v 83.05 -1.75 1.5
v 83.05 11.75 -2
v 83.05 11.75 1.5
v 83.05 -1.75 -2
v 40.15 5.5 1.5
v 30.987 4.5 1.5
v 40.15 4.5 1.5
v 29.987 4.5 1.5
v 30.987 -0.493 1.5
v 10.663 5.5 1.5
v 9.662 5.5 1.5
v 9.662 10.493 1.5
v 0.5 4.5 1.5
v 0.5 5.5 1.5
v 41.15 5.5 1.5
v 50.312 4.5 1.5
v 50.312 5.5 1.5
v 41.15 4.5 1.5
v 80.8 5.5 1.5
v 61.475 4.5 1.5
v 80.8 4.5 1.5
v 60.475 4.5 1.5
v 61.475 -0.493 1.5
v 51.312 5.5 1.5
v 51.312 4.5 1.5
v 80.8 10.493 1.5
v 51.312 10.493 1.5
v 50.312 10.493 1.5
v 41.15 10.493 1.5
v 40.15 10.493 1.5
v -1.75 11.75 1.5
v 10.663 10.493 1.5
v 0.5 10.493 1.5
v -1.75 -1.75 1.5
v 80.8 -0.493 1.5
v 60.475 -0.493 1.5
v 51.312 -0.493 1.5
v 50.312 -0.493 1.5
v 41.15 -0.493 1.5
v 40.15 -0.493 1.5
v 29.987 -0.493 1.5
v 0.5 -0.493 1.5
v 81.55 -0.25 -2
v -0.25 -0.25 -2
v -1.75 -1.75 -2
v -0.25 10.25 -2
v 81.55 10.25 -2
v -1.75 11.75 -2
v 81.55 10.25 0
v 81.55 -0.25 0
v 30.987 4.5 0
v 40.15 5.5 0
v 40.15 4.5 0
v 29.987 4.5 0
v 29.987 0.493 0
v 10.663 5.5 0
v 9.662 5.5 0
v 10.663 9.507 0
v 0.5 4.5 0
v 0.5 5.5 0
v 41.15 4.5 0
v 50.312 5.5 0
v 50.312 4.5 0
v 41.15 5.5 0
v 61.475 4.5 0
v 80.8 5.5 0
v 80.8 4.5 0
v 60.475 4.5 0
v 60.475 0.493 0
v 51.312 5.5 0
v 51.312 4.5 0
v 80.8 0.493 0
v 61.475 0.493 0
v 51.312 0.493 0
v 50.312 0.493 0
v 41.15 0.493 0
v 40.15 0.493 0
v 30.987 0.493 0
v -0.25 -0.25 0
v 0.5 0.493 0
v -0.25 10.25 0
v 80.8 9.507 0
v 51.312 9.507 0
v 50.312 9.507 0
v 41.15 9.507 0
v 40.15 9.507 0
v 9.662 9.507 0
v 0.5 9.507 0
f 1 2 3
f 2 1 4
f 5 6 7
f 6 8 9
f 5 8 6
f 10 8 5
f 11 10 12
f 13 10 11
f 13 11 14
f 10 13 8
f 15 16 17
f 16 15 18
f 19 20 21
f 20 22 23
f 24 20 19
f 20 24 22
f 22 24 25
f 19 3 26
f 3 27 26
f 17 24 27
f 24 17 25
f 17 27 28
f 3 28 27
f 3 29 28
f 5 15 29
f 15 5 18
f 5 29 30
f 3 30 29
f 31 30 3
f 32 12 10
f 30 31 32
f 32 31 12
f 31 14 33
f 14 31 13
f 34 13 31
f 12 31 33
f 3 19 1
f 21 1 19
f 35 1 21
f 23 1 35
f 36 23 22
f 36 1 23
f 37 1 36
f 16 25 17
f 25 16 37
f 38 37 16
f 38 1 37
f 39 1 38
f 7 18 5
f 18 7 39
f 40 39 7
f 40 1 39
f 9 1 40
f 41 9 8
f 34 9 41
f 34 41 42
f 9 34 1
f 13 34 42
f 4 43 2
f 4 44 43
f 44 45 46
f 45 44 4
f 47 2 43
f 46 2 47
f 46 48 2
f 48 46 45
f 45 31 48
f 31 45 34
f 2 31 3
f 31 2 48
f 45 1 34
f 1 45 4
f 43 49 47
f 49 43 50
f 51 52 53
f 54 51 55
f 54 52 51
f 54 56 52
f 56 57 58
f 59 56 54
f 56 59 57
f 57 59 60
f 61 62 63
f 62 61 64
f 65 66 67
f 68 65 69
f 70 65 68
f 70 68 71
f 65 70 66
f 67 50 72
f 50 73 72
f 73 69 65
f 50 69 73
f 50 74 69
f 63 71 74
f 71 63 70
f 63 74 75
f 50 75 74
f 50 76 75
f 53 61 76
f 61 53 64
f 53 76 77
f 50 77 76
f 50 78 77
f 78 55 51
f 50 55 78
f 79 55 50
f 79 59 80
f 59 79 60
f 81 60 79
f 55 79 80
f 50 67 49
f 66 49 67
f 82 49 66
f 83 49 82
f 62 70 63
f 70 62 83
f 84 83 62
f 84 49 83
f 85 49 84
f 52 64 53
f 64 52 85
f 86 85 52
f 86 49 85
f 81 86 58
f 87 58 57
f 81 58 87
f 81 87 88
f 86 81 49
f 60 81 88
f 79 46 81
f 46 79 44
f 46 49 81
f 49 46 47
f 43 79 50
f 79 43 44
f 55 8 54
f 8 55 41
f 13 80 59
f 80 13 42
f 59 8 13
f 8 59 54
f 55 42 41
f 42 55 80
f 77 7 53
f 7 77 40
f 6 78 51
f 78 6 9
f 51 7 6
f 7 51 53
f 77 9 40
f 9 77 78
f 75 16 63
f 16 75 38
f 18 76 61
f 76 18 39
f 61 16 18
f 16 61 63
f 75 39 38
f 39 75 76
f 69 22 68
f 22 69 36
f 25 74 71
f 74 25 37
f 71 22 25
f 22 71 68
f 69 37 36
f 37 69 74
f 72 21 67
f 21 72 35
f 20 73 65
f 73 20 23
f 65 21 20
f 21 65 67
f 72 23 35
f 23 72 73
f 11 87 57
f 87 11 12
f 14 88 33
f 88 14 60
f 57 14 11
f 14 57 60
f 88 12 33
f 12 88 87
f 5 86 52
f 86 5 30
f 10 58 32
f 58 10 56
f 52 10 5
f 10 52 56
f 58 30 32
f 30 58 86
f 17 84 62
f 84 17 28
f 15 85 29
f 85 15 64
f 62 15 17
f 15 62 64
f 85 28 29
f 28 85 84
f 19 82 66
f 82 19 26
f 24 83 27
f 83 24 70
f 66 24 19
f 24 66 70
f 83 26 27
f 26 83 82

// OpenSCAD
board_x=90.2;
board_y=20.1;
mount_hole_d=2;
mount_hole_inset=mount_hole_d/2 + 0.8; // +-0.1
wire_relief_y=2;
wire_relief_z=4;

indicator_x=81.3/8;
indicator_y=5;
indicator_z=6.3; // +-0.1
indicator_wall=0.6;
indicator_cut_tolerance=2;

spacer_cut_z=2;
spacer_z=1.5;
spacer_wall=1.5;
spacer_r=1;
spacer_mask_w=1;
spacer_flare_y=1;

window_x=82;
window_y=14;
bezel_z=3.3;
bezel_inset=1.4;

shell_x=94;
shell_y=26;
super_z=3.9;
mount_inset=4;

NOTHING=0.01;

module single_indicator(show_wall=true) {
    union() {
        cube([indicator_x, indicator_y, indicator_z]);
        if(show_wall) {
            color("white") translate([indicator_wall, indicator_wall, NOTHING]) cube([indicator_x-2*indicator_wall, indicator_y-2*indicator_wall, indicator_z]);

        }
    }
}

module indicator_array(num_x=1,num_y=1, show_wall=true) {
    union() {
        for(i = [0 : num_x-1]) {
            for (j = [0 : num_y-1]) {
                translate([i*indicator_x, j*indicator_y, 0]) single_indicator(show_wall);
            }
        }
    }
}

module indicator_cut(num_x=1, num_y=1) {
    cube([num_x*indicator_x + indicator_cut_tolerance, num_y*indicator_y + indicator_cut_tolerance, indicator_z]);
}


module spacer() {
    num_x=8;
    num_y=2;
    clearance=0.5;
    outer_x=num_x*indicator_x + 2*spacer_wall + clearance;
    outer_y=num_y*indicator_y + 2*spacer_wall + clearance;
    outer_z=spacer_cut_z + spacer_z;
    windows=[[[0,3],[3, 1],[4,1],[5,1],[6,2]], [[0,1],[1, 3],[4,1],[5, 3]]];
    difference() {
        translate([-spacer_wall - clearance/2, -spacer_wall - clearance/2, -spacer_cut_z]) union() {
            difference() {
                color("blue") cube([outer_x, outer_y, outer_z]);
                color("orange") translate([spacer_wall, spacer_wall, -NOTHING]) cube([outer_x-2*spacer_wall, outer_y-2*spacer_wall,spacer_cut_z+NOTHING]);
            }
        }
        for (j = [0 : len(windows) - 1]) {
            cur_row=windows[j];
            for (i = [0 : len(cur_row) - 1]) {
                offset_blocks=cur_row[i][0];
                cur_window_blocks=cur_row[i][1];
                echo (j, i, offset_blocks, cur_window_blocks);
                cur_window_w=cur_window_blocks*indicator_x-spacer_mask_w;
                translate([offset_blocks*indicator_x + spacer_mask_w/2, j*indicator_y + spacer_mask_w/2, -NOTHING]) union() {
                    cube([cur_window_w, indicator_y-spacer_mask_w, spacer_z + 2*NOTHING]);
                    if (j % 2 == 1) {
                        translate([0, indicator_y-spacer_mask_w, 0]) rotate([90, 0, 90]) linear_extrude(height=cur_window_w) {
                            polygon(points=[[0,0], [spacer_flare_y, spacer_z+2*NOTHING], [0, spacer_z+2*NOTHING]]);
                        }
                    } else {
                        rotate([90, 0, 90]) linear_extrude(height=cur_window_w) {
                            polygon(points=[[0,0], [-spacer_flare_y, spacer_z+2*NOTHING], [0, spacer_z+2*NOTHING]]);
                        }
                    }
                }
            }
        }
    }
}


// module fillet_negative(r, rotate_z=0, a=90, h=1000, x=0, y=0, z=0, rotate_y=0, rotate_z=0) {
//     $fn=1000;
//     translate([x, y, z]) rotate([rotate_x, rotate_y, rotate_z]) intersection() {
//         translate([-r-NOTHING, -r-NOTHING, -NOTHING]) cube([2*(r+NOTHING), 2*(r+NOTHING), h+2*NOTHING]);
//         rotate_extrude(angle=a) {
//             translate([r, 0, -NOTHING]) square([r+NOTHING, h+2*NOTHING]);
//         }
//     }
// }

// indicator_array(8,2, true);
// indicator_cut(8,2);

// fillet_negative(2, 0, 120, 10);

// indicator_array(8,2);
// translate([0,0, indicator_z]) spacer();

spacer();
